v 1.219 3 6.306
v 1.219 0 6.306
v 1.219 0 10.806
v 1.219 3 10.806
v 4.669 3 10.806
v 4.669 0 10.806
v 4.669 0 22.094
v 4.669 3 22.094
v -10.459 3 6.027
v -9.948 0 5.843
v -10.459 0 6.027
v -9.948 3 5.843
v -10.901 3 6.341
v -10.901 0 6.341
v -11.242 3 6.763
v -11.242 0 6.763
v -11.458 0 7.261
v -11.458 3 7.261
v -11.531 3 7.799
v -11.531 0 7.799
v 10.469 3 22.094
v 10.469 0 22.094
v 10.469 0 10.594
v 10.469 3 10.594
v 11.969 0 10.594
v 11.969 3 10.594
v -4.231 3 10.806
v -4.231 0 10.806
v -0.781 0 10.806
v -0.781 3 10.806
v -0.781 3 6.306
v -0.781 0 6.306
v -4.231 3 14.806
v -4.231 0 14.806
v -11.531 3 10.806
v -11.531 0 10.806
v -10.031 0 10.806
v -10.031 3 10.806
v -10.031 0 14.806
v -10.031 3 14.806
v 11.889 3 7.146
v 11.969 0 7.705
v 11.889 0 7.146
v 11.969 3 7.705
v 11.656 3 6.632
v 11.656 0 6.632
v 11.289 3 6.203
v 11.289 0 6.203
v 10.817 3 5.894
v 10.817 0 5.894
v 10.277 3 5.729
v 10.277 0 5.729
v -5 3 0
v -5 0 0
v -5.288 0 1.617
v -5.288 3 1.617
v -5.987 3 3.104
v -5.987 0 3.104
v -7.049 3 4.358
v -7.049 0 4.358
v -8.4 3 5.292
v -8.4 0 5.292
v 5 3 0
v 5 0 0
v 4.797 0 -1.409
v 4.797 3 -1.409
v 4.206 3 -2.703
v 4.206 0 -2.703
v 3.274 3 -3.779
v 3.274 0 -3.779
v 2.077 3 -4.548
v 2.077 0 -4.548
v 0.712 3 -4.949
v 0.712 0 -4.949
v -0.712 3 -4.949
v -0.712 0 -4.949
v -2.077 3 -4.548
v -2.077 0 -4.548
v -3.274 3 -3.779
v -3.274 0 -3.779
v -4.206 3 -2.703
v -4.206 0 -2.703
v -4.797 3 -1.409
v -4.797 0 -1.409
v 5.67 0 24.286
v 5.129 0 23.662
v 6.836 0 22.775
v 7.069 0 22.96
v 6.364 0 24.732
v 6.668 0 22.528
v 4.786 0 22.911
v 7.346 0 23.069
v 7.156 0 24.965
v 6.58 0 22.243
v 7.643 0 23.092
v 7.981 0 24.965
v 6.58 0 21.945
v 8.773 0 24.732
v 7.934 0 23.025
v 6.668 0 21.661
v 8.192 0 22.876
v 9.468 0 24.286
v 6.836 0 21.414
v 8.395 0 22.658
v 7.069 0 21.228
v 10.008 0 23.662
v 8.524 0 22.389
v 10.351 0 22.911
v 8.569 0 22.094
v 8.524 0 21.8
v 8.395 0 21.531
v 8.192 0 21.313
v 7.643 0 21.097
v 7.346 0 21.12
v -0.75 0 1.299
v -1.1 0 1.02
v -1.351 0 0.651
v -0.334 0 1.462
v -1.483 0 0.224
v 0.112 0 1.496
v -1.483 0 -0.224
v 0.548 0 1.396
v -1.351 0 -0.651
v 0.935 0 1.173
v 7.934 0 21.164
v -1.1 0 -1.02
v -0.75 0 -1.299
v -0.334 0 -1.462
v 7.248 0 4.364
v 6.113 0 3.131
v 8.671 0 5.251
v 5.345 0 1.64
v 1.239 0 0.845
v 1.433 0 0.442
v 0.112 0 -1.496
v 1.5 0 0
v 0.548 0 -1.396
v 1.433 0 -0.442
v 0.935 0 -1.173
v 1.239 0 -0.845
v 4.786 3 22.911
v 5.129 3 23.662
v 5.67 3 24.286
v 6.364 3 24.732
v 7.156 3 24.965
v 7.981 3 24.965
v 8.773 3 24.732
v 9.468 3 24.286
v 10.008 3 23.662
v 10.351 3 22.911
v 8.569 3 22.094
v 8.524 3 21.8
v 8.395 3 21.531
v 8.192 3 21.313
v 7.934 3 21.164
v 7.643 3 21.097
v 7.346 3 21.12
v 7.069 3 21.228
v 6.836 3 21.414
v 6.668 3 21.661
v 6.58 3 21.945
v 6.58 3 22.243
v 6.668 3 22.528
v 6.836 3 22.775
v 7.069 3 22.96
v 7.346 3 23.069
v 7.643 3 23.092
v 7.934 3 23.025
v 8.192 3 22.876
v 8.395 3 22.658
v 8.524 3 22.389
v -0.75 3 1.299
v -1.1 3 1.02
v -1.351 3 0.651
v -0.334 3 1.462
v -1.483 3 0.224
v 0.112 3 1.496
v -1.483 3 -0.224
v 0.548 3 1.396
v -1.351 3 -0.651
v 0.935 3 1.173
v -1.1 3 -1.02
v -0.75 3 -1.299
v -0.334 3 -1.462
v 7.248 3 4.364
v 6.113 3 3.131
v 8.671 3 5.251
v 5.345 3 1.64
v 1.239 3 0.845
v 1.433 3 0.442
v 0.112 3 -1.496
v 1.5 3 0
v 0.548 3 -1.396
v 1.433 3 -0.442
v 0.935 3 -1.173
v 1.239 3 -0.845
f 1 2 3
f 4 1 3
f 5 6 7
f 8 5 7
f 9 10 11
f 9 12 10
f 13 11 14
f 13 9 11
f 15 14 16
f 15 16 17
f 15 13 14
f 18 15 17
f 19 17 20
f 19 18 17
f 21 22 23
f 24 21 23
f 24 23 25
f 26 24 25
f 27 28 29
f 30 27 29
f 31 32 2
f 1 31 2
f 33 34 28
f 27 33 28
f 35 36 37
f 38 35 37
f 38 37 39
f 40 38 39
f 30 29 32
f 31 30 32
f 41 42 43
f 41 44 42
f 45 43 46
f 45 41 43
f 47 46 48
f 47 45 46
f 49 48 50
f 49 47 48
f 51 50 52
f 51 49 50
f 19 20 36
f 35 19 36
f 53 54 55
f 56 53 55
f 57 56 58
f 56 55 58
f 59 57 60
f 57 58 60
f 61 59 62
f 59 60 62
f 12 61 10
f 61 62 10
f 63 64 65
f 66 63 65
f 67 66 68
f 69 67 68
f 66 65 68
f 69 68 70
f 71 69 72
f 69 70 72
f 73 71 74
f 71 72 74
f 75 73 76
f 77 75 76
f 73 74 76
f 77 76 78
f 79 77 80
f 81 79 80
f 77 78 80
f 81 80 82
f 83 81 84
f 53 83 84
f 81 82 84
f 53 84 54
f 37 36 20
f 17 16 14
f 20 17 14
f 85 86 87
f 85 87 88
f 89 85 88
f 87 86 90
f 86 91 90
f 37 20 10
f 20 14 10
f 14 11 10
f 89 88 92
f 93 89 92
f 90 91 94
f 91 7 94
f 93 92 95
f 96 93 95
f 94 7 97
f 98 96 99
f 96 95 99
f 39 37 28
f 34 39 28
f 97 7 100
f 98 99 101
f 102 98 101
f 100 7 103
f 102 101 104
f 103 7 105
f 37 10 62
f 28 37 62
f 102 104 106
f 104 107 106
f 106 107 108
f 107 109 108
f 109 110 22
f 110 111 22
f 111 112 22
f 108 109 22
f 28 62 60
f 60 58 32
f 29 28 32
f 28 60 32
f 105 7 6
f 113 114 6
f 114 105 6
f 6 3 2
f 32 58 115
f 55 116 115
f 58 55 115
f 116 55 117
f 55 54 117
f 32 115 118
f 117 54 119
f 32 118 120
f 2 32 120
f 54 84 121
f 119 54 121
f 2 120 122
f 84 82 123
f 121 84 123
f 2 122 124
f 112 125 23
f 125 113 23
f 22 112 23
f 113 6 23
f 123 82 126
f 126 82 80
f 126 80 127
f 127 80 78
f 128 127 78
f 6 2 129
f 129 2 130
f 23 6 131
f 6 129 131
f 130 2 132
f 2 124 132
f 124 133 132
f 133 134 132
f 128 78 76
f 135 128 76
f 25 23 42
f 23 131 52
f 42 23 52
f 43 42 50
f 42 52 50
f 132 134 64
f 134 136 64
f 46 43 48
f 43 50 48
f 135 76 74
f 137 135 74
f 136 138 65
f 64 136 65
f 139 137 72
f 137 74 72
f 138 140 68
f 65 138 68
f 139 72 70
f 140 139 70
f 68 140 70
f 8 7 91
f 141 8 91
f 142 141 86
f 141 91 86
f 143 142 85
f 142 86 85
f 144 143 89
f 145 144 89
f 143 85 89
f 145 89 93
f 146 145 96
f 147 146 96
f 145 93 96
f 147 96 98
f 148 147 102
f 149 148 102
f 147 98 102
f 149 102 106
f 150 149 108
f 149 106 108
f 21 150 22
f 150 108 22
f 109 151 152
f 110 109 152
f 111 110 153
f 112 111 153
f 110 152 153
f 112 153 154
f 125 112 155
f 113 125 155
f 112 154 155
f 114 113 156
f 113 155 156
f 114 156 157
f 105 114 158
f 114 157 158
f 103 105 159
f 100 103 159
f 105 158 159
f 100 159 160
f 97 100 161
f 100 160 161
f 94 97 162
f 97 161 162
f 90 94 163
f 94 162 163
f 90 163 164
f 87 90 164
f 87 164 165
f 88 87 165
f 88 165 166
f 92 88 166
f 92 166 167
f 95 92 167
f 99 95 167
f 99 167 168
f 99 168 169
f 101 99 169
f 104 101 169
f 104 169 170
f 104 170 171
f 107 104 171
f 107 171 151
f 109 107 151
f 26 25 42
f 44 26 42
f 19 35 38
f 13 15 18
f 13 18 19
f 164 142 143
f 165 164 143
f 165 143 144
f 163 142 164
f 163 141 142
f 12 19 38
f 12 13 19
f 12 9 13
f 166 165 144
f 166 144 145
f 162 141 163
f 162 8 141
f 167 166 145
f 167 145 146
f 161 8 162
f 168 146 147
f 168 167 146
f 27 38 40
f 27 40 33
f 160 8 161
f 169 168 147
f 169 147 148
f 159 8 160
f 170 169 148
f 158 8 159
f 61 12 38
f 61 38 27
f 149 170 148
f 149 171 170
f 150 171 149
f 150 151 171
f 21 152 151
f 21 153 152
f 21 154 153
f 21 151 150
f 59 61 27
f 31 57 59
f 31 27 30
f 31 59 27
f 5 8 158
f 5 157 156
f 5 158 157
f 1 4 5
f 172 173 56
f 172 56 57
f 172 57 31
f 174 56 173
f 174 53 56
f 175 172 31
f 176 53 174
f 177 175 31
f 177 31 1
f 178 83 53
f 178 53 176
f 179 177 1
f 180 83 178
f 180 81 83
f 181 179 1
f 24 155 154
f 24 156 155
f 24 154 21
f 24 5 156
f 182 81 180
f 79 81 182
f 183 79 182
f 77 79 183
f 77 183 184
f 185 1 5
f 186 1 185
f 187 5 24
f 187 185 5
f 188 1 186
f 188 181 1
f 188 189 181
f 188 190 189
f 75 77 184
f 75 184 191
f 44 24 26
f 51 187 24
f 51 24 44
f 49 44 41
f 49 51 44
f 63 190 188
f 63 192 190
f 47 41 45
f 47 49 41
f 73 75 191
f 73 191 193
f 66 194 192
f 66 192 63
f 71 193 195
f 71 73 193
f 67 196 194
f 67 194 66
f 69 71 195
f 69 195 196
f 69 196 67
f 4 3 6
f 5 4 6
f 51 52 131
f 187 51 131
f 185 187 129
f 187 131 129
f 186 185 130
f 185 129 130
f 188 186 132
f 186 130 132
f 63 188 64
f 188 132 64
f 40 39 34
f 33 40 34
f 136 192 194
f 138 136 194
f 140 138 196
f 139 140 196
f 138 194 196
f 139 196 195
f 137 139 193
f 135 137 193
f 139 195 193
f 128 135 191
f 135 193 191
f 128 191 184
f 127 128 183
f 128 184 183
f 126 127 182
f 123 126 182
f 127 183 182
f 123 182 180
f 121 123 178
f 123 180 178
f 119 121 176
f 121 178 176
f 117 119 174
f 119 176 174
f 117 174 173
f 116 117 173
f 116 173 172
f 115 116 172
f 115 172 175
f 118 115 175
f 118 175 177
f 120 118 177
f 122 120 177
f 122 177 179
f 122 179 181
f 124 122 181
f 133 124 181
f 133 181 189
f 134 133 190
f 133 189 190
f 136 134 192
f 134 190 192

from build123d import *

# Parameters (mm, degrees)
BOSS_EXTRUDE1_DEPTH = 3
SKETCH3_R           = 1.5
CUT_EXTRUDE1_DEPTH  = 3
FILLET1_R           = 2
SKETCH4_R           = 1
CUT_EXTRUDE2_DEPTH  = 10


with BuildPart() as part:
    # Sketch2 → Boss-Extrude1 (new body)
    with BuildSketch(Plane(origin=(0, 0, 0), x_dir=(1, 0, 0), z_dir=(0, 1, 0))):
        with BuildLine():
            Line((4.668611776, -14.59443044), (4.668611776, -22.09443044))
            ThreePointArc((4.668611776, -22.09443044), (7.568611776, -24.99443044), (10.468611776, -22.09443044))
            Line((10.468611776, -22.09443044), (10.468611776, -14.59443044))
            Line((10.468611776, -14.59443044), (10.468611776, -10.59443044))
            Line((10.468611776, -10.59443044), (11.968611776, -10.59443044))
            Line((11.968611776, -10.59443044), (11.968611776, -5.761851858))
            ThreePointArc((11.968611776, -5.761851858), (7.254363967, -4.368466387), (5, 0))
            ThreePointArc((5, 0), (0, 5), (-5, 0))
            ThreePointArc((-5, 0), (-7.028472422, -4.339612176), (-11.531388224, -5.973834769))
            Line((-11.531388224, -5.973834769), (-11.531388224, -10.806413351))
            Line((-11.531388224, -10.806413351), (-10.031388224, -10.806413351))
            Line((-10.031388224, -10.806413351), (-10.031388224, -14.806413351))
            Line((-10.031388224, -14.806413351), (-4.231388224, -14.806413351))
            Line((-4.231388224, -14.806413351), (-4.231388224, -10.806413351))
            Line((-4.231388224, -10.806413351), (-0.781388224, -10.806413351))
            Line((-0.781388224, -10.806413351), (-0.781388224, -6.306413351))
            Line((-0.781388224, -6.306413351), (1.218611776, -6.306413351))
            Line((1.218611776, -6.306413351), (1.218611776, -10.806413351))
            Line((1.218611776, -10.806413351), (4.668611776, -10.806413351))
            Line((4.668611776, -10.806413351), (4.668611776, -14.59443044))
        make_face()
    extrude(amount=BOSS_EXTRUDE1_DEPTH)

    # Sketch3 → Cut-Extrude1 (cut)
    with BuildSketch(Plane(origin=(0, 3, 0), x_dir=(1, 0, 0), z_dir=(0, 1, 0))):
        Circle(SKETCH3_R)
    extrude(amount=-CUT_EXTRUDE1_DEPTH, mode=Mode.SUBTRACT)

    # Fillet1
    fillet1_edges = [part.edges().sort_by_distance(p)[0] for p in [
        (-11.531388224, 1.5, 5.973834769),
        (11.968611776, 1.5, 5.761851858),
    ]]
    fillet(fillet1_edges, radius=FILLET1_R)

    # Sketch4 → Cut-Extrude2 (cut)
    with BuildSketch(Plane(origin=(0, 3, 0), x_dir=(1, 0, 0), z_dir=(0, 1, 0))):
        with Locations((7.568611776, -22.09443044)):
            Circle(SKETCH4_R)
    extrude(amount=-CUT_EXTRUDE2_DEPTH, mode=Mode.SUBTRACT)


solid = part.part
